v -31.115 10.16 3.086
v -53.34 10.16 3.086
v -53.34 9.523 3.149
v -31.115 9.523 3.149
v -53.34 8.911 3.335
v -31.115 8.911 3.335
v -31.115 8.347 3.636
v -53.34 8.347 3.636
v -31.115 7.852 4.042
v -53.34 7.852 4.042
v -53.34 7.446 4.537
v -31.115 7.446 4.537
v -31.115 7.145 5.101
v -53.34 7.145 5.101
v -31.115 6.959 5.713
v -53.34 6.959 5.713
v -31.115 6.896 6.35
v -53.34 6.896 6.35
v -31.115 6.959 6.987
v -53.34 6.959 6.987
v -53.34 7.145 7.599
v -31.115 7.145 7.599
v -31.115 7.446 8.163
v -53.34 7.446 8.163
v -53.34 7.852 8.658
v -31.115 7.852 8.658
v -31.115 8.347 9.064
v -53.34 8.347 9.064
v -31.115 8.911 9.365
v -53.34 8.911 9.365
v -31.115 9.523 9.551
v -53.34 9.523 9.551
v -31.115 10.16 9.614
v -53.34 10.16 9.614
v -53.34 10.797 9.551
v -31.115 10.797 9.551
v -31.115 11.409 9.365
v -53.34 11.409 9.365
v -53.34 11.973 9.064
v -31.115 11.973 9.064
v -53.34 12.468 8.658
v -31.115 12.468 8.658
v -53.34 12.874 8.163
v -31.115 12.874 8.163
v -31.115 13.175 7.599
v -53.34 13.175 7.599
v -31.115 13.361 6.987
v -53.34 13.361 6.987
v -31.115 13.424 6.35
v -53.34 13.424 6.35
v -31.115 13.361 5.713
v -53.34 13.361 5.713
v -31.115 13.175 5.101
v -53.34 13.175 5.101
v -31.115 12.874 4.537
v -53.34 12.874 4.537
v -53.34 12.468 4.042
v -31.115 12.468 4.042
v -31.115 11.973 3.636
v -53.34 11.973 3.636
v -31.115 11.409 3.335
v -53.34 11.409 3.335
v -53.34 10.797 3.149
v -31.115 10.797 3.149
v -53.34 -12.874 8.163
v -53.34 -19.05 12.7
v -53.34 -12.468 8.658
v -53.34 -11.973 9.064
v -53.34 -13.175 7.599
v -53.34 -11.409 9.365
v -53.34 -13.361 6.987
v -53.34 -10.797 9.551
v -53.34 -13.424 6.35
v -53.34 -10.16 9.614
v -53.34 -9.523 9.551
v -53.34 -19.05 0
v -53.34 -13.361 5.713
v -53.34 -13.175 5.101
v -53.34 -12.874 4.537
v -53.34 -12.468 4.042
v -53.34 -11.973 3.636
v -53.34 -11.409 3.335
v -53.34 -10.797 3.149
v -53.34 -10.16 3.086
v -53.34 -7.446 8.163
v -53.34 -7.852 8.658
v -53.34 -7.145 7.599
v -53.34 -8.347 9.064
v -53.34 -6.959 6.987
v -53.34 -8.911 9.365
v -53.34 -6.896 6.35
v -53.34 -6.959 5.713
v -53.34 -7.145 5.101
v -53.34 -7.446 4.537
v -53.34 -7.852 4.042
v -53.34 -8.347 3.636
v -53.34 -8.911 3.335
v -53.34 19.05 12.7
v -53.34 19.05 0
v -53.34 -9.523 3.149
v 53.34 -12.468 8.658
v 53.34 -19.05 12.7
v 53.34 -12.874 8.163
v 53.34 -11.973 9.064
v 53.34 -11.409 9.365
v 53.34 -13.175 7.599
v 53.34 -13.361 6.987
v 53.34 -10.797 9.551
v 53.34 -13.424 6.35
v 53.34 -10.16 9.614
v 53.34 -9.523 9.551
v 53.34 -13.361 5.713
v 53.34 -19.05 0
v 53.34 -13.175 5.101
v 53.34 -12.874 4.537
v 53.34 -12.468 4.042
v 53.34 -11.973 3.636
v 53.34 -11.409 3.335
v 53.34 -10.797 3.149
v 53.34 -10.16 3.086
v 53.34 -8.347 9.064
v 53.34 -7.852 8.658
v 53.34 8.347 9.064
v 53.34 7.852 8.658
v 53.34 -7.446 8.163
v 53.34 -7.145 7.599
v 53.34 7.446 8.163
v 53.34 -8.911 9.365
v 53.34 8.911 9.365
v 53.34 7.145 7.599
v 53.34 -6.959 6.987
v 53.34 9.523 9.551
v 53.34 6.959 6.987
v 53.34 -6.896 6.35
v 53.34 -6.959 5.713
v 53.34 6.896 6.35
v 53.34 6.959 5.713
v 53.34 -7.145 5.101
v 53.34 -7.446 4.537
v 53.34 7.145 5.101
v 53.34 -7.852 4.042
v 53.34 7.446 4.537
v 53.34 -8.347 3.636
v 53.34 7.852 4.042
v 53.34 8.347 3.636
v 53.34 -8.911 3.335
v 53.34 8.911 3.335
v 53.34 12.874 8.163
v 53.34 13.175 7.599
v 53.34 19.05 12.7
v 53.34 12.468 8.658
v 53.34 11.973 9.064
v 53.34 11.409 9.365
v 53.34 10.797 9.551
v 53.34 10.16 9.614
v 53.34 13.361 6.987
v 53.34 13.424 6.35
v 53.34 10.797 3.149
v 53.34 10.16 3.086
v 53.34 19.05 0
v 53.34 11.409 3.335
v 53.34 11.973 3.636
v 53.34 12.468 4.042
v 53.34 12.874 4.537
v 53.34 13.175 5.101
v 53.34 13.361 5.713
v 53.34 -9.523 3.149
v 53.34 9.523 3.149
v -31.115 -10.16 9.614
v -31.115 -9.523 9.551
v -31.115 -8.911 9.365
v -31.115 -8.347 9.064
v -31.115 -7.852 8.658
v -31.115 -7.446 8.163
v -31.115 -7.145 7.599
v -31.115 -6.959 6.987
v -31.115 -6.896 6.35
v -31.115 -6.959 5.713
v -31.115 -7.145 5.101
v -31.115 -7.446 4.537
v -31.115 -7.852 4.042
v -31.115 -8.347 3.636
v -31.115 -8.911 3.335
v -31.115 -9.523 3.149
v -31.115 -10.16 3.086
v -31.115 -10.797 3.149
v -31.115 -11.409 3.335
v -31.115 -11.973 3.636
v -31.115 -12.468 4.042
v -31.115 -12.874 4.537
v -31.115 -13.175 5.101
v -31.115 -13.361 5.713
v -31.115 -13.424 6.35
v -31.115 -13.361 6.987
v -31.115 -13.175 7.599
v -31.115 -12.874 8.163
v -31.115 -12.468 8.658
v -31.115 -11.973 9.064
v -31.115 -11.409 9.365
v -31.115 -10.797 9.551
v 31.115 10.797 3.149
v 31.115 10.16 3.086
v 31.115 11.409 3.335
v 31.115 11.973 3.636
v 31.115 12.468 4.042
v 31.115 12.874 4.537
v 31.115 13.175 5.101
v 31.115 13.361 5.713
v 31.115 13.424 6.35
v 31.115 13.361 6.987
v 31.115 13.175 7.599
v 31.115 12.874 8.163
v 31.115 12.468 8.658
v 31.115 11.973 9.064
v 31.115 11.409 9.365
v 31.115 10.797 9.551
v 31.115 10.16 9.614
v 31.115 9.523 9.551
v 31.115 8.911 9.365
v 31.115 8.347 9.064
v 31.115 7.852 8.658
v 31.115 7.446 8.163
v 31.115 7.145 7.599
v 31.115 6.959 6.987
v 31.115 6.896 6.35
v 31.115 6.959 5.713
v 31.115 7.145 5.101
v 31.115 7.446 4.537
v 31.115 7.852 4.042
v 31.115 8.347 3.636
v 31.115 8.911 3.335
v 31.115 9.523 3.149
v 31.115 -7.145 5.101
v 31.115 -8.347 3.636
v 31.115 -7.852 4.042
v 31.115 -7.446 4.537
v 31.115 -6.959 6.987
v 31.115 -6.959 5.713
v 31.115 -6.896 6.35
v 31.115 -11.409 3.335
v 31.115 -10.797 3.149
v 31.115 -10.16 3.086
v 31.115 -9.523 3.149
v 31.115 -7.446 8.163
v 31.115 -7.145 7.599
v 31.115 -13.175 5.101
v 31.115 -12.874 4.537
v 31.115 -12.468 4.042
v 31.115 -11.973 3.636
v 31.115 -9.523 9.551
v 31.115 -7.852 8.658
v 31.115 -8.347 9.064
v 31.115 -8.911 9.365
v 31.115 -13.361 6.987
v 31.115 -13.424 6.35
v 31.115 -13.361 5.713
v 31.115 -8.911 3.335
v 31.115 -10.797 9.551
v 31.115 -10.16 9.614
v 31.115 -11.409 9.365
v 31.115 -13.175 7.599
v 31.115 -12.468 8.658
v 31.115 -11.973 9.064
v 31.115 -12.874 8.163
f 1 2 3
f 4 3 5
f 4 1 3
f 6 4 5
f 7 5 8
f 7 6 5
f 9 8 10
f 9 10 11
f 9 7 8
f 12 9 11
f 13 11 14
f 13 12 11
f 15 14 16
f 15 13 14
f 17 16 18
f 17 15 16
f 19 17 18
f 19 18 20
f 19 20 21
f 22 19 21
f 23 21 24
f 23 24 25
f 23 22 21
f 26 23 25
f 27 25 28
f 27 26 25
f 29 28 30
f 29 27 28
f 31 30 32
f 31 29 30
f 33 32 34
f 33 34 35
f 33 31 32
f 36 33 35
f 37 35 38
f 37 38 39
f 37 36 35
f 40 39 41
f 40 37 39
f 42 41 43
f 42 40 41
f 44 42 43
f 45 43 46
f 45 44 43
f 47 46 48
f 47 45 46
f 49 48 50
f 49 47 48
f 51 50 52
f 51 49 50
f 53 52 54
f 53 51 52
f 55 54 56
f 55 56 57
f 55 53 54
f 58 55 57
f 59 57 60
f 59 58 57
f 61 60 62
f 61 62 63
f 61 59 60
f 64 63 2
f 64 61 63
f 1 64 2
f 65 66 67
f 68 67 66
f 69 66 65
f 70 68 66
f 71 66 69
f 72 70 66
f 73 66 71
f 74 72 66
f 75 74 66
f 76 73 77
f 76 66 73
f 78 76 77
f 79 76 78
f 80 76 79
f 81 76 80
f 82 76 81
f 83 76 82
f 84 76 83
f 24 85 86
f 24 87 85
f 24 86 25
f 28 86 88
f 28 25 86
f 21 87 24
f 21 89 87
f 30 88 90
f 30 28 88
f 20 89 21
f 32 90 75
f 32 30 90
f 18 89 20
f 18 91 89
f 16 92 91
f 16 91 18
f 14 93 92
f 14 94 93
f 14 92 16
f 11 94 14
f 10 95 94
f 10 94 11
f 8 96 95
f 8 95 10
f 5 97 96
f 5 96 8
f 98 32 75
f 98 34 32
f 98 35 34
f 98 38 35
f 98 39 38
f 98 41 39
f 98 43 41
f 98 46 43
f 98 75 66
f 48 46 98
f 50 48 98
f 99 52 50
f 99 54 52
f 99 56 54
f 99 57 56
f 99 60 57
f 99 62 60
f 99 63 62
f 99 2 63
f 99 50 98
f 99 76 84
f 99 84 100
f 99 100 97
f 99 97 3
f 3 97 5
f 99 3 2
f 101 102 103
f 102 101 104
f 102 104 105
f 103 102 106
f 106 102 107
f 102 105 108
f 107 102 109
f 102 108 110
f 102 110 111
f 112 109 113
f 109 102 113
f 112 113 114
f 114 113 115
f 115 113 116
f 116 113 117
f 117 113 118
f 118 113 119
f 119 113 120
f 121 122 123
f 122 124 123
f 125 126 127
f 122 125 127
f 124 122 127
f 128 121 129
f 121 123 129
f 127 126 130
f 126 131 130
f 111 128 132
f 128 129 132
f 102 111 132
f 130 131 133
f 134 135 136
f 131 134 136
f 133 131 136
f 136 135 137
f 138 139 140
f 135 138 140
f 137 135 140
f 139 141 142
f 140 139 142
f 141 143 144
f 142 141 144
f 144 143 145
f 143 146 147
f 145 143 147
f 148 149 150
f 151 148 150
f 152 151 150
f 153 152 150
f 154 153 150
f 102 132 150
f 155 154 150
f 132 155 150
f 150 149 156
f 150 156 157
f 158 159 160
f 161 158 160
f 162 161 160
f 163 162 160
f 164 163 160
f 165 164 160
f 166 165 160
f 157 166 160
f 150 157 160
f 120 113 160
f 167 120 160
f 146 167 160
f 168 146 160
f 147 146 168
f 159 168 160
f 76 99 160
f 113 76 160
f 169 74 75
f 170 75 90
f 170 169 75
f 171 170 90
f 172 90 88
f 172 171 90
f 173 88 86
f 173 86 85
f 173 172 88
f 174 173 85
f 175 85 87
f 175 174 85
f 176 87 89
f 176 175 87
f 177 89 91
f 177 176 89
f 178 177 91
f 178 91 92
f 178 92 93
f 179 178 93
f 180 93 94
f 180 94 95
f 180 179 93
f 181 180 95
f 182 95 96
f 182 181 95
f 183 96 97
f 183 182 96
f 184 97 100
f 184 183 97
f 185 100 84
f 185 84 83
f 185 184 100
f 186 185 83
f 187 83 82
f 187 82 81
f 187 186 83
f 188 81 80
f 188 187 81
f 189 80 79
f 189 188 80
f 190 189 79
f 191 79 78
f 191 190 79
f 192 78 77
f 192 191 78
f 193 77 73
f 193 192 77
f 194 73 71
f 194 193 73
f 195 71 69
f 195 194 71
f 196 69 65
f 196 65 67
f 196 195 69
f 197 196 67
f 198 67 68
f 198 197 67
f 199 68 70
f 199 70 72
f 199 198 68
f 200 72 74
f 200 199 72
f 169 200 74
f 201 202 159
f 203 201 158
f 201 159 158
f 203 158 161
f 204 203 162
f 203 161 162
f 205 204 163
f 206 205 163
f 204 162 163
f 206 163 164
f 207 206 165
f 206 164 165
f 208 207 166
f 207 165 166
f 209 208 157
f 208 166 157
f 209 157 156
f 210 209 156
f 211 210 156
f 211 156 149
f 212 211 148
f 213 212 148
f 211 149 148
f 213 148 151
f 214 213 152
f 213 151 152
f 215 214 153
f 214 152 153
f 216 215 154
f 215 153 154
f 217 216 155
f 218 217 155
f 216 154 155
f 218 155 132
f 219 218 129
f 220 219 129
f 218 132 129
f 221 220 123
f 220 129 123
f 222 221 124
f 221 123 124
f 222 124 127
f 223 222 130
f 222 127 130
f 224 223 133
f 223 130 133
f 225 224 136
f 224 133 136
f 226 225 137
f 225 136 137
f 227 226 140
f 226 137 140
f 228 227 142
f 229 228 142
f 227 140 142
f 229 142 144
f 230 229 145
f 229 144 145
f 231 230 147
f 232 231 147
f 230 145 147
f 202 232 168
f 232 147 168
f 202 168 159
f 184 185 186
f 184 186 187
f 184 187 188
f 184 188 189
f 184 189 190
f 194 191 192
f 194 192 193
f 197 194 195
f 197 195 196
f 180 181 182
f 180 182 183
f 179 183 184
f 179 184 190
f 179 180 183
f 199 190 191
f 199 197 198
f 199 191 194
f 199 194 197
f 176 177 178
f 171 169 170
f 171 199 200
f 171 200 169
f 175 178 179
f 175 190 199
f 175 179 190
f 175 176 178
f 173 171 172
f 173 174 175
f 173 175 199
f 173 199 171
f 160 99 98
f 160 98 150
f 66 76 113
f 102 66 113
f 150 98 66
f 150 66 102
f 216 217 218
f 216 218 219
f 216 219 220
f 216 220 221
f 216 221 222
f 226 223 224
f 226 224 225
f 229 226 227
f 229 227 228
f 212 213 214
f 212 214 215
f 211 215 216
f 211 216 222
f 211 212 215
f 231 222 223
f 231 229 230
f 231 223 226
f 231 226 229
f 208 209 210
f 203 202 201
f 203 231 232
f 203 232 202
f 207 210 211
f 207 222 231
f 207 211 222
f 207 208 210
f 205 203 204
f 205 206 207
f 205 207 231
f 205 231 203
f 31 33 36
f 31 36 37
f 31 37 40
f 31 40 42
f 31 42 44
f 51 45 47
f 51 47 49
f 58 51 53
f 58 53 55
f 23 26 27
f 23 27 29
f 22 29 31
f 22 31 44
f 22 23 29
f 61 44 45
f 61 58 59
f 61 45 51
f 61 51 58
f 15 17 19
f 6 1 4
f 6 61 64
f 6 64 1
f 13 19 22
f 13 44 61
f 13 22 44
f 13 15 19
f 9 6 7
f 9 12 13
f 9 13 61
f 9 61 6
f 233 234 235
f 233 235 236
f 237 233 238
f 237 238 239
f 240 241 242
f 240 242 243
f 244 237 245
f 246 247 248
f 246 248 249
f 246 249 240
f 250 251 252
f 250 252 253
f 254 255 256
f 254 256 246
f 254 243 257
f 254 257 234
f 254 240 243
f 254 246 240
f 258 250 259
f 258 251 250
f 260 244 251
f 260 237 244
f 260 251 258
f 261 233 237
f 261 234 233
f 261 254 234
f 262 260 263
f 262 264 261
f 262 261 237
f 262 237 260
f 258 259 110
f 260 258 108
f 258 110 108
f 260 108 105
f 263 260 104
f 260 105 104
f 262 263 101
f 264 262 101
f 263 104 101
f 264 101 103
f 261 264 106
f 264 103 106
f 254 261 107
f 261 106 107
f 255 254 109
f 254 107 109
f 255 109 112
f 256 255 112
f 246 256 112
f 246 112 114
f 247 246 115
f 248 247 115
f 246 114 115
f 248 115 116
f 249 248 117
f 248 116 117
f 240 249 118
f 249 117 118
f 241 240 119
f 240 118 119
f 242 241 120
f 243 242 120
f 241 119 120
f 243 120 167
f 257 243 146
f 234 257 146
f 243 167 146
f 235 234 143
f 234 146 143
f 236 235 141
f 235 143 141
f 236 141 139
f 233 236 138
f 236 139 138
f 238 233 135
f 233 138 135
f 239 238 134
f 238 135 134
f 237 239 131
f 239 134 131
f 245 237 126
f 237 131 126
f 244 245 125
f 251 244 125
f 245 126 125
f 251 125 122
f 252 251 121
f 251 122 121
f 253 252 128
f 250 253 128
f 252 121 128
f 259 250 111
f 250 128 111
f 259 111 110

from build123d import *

# Parameters (mm, degrees)
SKETCH1_W           = 106.68
SKETCH1_H           = 38.1
BOSS_EXTRUDE1_DEPTH = 12.7
SKETCH2_R           = 3.2639
CUT_EXTRUDE1_DEPTH  = 22.225
CUT_EXTRUDE2_START  = -22.225
SKETCH3_R           = 3.2639
CUT_EXTRUDE2_DEPTH  = 22.225


with BuildPart() as part:
    # Sketch1 → Boss-Extrude1 (new body)
    with BuildSketch(Plane.XY):
        Rectangle(SKETCH1_W, SKETCH1_H)
    extrude(amount=BOSS_EXTRUDE1_DEPTH)

    # Sketch2 → Cut-Extrude1 (cut)
    with BuildSketch(Plane(origin=(53.34, 0, 0), x_dir=(0, 0, -1), z_dir=(1, 0, 0))):
        with Locations((-6.35, 10.16)):
            Circle(SKETCH2_R)
        with Locations(Location((-6.35, -10.16, 0), (0, 0, 180))):
            Circle(SKETCH2_R)
    extrude(amount=-CUT_EXTRUDE1_DEPTH, mode=Mode.SUBTRACT)

    # Sketch3 → Cut-Extrude2 (cut)
    with BuildSketch(Plane.ZY.offset(53.34).offset(CUT_EXTRUDE2_START)):
        with Locations(Location((6.35, 10.16, 0), (0, 0, 180))):
            Circle(SKETCH3_R)
        with Locations((6.35, -10.16)):
            Circle(SKETCH3_R)
    extrude(amount=CUT_EXTRUDE2_DEPTH, mode=Mode.SUBTRACT)


solid = part.part
